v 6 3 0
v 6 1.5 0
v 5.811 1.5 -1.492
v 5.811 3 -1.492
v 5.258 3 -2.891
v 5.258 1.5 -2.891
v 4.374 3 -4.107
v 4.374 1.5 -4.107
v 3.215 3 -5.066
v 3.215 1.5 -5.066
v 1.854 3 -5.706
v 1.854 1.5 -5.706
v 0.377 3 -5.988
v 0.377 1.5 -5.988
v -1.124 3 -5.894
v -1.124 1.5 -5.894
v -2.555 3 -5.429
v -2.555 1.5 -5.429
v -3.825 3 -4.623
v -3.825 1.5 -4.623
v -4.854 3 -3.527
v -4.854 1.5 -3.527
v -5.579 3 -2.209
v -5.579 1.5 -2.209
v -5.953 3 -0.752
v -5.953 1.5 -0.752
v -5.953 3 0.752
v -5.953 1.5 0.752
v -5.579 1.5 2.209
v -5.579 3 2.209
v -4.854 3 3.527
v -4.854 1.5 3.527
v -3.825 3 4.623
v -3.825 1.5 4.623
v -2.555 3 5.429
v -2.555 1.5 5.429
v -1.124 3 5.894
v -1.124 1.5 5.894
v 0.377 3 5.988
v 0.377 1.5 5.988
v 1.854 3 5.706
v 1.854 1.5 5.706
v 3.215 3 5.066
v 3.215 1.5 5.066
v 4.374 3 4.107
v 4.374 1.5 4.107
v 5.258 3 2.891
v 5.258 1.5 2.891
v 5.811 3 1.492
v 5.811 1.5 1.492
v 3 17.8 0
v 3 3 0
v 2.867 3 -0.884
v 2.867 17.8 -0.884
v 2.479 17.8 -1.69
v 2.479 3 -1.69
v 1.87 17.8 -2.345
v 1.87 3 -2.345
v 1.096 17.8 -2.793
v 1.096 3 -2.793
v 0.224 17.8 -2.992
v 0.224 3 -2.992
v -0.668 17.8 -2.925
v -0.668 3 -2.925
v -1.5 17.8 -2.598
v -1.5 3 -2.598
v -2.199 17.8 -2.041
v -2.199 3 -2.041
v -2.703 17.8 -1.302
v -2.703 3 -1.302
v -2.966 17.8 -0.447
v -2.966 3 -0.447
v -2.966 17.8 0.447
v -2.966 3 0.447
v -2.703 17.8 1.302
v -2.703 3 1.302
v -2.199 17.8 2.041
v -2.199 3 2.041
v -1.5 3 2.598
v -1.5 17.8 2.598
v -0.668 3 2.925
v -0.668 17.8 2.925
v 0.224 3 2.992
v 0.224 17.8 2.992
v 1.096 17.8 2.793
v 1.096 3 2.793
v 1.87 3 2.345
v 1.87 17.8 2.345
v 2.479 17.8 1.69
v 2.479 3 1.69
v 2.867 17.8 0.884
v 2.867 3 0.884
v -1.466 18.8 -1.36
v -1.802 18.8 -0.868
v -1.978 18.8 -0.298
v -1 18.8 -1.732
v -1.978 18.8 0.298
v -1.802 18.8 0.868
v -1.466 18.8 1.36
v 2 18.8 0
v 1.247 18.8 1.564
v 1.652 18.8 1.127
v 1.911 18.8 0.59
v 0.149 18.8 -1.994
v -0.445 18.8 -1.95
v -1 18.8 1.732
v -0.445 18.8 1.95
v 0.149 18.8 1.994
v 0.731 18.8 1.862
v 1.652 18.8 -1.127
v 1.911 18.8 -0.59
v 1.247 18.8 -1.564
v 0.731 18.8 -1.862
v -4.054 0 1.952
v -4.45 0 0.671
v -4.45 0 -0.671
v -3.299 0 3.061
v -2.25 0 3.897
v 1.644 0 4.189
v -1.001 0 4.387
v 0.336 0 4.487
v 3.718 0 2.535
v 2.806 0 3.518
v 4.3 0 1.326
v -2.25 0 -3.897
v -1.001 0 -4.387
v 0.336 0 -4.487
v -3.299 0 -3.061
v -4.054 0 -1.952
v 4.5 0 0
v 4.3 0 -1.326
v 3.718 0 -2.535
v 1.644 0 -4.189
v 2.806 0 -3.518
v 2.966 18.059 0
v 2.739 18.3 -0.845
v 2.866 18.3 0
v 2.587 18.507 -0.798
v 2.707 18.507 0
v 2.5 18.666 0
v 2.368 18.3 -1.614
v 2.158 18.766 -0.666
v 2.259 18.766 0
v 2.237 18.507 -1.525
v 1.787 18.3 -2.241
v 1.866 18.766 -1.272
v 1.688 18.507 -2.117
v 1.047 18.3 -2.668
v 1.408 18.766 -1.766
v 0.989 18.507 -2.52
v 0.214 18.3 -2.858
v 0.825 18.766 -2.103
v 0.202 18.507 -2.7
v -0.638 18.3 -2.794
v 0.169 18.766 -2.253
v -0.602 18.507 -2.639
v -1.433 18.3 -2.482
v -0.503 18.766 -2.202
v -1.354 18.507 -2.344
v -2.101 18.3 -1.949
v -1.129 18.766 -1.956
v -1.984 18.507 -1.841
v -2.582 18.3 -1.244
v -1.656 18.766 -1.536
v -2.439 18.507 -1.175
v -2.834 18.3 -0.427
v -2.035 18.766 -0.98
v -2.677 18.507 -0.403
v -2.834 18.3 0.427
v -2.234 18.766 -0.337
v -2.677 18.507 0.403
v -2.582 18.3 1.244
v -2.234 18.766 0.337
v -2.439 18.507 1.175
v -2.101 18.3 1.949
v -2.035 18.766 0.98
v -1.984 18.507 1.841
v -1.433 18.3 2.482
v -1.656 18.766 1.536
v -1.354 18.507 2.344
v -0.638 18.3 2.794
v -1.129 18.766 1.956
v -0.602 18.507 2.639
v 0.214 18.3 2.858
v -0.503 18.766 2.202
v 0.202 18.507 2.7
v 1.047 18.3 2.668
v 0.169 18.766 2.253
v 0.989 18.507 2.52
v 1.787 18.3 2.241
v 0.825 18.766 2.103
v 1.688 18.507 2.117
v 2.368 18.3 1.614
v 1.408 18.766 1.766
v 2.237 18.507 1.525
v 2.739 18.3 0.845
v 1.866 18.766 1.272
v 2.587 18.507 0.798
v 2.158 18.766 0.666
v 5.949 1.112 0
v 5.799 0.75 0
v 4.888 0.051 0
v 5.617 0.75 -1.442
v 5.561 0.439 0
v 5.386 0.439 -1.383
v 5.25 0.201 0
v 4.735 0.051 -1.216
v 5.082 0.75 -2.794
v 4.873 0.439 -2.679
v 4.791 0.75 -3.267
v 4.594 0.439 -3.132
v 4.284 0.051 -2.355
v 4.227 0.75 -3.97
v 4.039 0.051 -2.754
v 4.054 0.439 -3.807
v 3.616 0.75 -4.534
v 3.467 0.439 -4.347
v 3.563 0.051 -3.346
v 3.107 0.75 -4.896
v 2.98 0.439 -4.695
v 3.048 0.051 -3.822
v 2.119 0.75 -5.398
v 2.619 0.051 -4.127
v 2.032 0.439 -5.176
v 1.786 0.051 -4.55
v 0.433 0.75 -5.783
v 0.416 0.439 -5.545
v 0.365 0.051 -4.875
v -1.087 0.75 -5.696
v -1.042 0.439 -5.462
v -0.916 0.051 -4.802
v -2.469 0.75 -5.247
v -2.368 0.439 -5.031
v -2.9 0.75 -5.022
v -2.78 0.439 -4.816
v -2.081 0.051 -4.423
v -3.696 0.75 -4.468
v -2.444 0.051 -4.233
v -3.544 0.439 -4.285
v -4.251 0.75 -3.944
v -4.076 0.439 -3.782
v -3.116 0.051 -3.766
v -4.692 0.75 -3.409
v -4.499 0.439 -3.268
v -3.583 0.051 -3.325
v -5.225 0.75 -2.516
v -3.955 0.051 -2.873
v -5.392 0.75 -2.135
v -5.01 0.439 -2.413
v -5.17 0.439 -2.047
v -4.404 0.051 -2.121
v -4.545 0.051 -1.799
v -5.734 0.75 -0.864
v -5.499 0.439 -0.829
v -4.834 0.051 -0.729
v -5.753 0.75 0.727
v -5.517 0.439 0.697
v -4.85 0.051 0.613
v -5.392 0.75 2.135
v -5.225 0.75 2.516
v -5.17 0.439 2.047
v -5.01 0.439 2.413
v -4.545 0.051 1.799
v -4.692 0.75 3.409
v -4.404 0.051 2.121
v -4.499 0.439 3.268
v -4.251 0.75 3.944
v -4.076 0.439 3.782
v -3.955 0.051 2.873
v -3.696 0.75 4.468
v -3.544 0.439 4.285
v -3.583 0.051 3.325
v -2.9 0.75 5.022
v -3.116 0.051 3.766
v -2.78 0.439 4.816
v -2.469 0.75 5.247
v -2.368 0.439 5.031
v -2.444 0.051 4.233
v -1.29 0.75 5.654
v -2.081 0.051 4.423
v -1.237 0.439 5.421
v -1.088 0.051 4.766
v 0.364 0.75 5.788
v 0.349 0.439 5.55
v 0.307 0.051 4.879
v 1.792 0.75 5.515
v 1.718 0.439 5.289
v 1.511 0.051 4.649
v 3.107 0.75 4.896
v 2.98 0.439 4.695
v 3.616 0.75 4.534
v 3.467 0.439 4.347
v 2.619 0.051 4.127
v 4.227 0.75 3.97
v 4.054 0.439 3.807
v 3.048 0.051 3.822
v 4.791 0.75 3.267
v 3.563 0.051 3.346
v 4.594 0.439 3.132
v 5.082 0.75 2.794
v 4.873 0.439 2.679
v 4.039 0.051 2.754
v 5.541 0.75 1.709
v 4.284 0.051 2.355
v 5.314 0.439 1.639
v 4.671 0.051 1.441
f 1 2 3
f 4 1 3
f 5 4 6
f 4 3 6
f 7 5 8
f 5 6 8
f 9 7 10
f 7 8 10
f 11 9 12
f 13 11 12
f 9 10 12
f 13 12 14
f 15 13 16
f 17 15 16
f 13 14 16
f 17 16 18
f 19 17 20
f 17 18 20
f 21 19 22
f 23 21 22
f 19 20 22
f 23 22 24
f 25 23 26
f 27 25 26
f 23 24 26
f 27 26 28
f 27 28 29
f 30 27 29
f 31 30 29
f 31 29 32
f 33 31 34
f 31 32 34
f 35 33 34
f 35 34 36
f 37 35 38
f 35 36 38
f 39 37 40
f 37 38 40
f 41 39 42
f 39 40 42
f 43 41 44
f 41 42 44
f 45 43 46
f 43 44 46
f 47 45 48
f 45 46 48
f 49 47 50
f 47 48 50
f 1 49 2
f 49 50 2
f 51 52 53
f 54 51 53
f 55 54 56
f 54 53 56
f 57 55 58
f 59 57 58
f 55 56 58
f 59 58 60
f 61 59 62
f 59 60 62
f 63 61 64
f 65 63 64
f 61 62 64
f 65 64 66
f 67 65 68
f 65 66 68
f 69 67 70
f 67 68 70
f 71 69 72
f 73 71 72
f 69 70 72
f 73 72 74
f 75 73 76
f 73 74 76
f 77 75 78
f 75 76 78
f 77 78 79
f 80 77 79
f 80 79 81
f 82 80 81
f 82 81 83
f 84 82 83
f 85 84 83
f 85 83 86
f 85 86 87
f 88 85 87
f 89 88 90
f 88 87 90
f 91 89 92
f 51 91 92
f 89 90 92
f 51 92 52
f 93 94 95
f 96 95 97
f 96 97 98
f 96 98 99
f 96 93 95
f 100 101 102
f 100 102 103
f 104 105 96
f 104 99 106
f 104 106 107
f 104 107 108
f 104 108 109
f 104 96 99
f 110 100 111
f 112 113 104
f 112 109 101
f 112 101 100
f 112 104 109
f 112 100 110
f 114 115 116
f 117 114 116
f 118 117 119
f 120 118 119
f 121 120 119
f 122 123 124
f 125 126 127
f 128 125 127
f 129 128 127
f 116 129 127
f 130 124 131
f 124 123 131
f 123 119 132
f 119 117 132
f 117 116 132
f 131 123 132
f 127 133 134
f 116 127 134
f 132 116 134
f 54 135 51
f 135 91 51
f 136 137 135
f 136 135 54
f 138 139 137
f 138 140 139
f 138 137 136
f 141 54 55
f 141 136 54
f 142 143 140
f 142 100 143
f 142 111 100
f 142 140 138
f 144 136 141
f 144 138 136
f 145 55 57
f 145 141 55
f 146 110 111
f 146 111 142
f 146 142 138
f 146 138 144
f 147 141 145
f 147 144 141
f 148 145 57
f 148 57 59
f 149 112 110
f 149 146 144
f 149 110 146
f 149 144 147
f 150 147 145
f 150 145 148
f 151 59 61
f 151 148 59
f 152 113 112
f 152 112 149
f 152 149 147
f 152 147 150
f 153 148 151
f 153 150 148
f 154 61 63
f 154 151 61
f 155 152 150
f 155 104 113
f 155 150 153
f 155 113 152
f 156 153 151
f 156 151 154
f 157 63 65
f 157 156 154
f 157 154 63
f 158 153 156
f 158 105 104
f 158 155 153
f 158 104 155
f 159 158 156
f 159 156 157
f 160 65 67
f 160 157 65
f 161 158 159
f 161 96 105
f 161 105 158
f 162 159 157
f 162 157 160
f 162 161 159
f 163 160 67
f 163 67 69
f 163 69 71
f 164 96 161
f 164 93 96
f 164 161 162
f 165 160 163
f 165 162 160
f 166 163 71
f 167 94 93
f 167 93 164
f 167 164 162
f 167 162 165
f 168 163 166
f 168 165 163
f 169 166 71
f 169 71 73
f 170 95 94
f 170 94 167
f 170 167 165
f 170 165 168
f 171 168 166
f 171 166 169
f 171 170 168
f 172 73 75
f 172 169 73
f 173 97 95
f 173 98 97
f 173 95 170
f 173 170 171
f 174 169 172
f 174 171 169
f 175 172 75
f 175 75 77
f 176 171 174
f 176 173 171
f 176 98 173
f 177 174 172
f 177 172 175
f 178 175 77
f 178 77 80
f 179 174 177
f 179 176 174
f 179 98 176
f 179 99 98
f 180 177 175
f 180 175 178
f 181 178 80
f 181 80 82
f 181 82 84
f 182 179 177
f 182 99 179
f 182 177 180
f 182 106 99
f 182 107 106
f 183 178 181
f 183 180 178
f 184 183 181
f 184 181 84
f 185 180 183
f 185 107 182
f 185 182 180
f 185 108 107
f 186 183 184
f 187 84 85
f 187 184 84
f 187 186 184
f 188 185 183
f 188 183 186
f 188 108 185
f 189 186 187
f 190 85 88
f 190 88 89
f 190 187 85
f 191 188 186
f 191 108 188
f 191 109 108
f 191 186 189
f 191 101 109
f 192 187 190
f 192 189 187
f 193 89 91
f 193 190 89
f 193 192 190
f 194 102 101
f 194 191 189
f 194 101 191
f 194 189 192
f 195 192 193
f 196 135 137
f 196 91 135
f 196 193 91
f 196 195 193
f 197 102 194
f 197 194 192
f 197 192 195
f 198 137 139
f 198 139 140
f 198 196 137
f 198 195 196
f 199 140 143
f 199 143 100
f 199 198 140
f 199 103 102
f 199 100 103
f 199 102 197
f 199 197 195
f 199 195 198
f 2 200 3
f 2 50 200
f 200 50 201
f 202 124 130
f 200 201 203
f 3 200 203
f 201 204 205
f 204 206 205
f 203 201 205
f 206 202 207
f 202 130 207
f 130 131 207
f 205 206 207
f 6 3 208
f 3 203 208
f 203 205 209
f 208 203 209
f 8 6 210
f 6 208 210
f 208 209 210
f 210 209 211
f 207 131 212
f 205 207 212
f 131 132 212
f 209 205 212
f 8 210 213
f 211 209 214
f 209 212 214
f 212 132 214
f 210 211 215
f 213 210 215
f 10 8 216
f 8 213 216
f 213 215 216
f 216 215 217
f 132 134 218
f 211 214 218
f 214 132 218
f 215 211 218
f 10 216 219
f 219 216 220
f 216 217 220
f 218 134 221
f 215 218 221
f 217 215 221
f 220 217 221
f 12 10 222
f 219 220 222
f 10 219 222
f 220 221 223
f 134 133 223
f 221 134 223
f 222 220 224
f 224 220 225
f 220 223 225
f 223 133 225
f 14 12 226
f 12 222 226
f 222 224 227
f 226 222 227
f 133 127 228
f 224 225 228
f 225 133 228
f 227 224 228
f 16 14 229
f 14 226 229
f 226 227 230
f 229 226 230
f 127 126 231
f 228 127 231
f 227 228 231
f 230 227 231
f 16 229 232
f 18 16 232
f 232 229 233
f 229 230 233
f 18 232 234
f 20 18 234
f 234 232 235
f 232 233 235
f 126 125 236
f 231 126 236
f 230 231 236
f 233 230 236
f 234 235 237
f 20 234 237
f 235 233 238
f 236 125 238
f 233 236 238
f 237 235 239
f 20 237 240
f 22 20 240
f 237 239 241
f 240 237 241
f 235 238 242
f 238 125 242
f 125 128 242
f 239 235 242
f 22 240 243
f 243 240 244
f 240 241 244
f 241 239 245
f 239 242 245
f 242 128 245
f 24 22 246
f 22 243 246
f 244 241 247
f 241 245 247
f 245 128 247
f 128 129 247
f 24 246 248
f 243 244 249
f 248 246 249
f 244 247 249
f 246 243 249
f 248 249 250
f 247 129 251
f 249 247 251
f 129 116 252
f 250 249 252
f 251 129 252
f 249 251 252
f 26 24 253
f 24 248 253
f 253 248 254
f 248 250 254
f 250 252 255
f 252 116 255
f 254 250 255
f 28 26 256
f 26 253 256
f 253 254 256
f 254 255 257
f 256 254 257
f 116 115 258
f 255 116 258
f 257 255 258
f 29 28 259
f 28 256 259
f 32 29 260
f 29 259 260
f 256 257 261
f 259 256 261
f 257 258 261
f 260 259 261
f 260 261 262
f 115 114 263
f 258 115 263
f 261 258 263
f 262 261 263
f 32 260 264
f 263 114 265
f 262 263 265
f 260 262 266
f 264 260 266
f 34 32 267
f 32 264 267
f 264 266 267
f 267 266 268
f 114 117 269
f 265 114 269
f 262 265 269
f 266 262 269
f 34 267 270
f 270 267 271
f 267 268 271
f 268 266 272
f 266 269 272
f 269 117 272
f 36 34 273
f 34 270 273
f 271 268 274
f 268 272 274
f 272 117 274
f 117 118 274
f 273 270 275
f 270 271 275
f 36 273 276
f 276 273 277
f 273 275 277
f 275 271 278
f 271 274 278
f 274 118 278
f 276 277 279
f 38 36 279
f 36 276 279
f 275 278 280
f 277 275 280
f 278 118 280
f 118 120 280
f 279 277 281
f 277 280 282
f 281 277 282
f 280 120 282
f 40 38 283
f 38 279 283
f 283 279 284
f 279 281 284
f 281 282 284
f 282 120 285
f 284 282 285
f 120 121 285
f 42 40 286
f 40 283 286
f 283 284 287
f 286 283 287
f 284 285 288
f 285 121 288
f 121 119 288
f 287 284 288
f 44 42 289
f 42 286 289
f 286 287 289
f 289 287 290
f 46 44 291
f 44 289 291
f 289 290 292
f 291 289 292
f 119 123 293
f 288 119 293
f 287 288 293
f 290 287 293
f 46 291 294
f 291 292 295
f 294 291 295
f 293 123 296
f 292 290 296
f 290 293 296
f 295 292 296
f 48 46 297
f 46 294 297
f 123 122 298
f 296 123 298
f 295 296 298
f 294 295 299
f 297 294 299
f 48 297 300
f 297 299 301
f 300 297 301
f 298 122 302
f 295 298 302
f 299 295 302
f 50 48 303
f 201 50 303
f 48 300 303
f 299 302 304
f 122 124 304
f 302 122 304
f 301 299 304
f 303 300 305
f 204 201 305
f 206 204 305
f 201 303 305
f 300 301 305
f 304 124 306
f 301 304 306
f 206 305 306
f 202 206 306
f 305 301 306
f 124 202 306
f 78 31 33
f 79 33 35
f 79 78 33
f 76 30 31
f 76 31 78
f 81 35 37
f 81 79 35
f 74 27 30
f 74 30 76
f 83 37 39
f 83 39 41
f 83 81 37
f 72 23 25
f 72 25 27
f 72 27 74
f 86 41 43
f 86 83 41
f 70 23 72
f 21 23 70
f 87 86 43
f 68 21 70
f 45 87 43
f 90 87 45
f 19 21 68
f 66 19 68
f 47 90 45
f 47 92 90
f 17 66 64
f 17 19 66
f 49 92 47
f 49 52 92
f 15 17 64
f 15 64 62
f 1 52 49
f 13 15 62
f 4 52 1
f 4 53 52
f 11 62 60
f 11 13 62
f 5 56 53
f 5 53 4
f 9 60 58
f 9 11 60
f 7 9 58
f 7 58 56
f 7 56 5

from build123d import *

# Parameters (mm, degrees)
SKETCH_1_R      = 6
EXTRUDE_1_DEPTH = 3
SKETCH_2_R      = 3
EXTRUDE_2_DEPTH = 15.8
FILLET_1_R      = 1
FILLET_2_R      = 1.5


with BuildPart() as part:
    # ｽｹｯﾁ1 → ﾎﾞｽ - 押し出し1 (new body)
    with BuildSketch(Plane(origin=(0, 0, 0), x_dir=(1, 0, 0), z_dir=(0, 1, 0))):
        Circle(SKETCH_1_R)
    extrude(amount=EXTRUDE_1_DEPTH)

    # ｽｹｯﾁ2 → ﾎﾞｽ - 押し出し2 (add)
    with BuildSketch(Plane(origin=(0, 3, 0), x_dir=(1, 0, 0), z_dir=(0, 1, 0))):
        Circle(SKETCH_2_R)
    extrude(amount=EXTRUDE_2_DEPTH)

    # ﾌｨﾚｯﾄ1
    fillet_1_edges = [part.edges().sort_by_distance(p)[0] for p in [
        (-3, 18.8, 0),
    ]]
    fillet(fillet_1_edges, radius=FILLET_1_R)

    # ﾌｨﾚｯﾄ2
    fillet_2_edges = [part.edges().sort_by_distance(p)[0] for p in [
        (-6, 0, 0),
    ]]
    fillet(fillet_2_edges, radius=FILLET_2_R)


solid = part.part
